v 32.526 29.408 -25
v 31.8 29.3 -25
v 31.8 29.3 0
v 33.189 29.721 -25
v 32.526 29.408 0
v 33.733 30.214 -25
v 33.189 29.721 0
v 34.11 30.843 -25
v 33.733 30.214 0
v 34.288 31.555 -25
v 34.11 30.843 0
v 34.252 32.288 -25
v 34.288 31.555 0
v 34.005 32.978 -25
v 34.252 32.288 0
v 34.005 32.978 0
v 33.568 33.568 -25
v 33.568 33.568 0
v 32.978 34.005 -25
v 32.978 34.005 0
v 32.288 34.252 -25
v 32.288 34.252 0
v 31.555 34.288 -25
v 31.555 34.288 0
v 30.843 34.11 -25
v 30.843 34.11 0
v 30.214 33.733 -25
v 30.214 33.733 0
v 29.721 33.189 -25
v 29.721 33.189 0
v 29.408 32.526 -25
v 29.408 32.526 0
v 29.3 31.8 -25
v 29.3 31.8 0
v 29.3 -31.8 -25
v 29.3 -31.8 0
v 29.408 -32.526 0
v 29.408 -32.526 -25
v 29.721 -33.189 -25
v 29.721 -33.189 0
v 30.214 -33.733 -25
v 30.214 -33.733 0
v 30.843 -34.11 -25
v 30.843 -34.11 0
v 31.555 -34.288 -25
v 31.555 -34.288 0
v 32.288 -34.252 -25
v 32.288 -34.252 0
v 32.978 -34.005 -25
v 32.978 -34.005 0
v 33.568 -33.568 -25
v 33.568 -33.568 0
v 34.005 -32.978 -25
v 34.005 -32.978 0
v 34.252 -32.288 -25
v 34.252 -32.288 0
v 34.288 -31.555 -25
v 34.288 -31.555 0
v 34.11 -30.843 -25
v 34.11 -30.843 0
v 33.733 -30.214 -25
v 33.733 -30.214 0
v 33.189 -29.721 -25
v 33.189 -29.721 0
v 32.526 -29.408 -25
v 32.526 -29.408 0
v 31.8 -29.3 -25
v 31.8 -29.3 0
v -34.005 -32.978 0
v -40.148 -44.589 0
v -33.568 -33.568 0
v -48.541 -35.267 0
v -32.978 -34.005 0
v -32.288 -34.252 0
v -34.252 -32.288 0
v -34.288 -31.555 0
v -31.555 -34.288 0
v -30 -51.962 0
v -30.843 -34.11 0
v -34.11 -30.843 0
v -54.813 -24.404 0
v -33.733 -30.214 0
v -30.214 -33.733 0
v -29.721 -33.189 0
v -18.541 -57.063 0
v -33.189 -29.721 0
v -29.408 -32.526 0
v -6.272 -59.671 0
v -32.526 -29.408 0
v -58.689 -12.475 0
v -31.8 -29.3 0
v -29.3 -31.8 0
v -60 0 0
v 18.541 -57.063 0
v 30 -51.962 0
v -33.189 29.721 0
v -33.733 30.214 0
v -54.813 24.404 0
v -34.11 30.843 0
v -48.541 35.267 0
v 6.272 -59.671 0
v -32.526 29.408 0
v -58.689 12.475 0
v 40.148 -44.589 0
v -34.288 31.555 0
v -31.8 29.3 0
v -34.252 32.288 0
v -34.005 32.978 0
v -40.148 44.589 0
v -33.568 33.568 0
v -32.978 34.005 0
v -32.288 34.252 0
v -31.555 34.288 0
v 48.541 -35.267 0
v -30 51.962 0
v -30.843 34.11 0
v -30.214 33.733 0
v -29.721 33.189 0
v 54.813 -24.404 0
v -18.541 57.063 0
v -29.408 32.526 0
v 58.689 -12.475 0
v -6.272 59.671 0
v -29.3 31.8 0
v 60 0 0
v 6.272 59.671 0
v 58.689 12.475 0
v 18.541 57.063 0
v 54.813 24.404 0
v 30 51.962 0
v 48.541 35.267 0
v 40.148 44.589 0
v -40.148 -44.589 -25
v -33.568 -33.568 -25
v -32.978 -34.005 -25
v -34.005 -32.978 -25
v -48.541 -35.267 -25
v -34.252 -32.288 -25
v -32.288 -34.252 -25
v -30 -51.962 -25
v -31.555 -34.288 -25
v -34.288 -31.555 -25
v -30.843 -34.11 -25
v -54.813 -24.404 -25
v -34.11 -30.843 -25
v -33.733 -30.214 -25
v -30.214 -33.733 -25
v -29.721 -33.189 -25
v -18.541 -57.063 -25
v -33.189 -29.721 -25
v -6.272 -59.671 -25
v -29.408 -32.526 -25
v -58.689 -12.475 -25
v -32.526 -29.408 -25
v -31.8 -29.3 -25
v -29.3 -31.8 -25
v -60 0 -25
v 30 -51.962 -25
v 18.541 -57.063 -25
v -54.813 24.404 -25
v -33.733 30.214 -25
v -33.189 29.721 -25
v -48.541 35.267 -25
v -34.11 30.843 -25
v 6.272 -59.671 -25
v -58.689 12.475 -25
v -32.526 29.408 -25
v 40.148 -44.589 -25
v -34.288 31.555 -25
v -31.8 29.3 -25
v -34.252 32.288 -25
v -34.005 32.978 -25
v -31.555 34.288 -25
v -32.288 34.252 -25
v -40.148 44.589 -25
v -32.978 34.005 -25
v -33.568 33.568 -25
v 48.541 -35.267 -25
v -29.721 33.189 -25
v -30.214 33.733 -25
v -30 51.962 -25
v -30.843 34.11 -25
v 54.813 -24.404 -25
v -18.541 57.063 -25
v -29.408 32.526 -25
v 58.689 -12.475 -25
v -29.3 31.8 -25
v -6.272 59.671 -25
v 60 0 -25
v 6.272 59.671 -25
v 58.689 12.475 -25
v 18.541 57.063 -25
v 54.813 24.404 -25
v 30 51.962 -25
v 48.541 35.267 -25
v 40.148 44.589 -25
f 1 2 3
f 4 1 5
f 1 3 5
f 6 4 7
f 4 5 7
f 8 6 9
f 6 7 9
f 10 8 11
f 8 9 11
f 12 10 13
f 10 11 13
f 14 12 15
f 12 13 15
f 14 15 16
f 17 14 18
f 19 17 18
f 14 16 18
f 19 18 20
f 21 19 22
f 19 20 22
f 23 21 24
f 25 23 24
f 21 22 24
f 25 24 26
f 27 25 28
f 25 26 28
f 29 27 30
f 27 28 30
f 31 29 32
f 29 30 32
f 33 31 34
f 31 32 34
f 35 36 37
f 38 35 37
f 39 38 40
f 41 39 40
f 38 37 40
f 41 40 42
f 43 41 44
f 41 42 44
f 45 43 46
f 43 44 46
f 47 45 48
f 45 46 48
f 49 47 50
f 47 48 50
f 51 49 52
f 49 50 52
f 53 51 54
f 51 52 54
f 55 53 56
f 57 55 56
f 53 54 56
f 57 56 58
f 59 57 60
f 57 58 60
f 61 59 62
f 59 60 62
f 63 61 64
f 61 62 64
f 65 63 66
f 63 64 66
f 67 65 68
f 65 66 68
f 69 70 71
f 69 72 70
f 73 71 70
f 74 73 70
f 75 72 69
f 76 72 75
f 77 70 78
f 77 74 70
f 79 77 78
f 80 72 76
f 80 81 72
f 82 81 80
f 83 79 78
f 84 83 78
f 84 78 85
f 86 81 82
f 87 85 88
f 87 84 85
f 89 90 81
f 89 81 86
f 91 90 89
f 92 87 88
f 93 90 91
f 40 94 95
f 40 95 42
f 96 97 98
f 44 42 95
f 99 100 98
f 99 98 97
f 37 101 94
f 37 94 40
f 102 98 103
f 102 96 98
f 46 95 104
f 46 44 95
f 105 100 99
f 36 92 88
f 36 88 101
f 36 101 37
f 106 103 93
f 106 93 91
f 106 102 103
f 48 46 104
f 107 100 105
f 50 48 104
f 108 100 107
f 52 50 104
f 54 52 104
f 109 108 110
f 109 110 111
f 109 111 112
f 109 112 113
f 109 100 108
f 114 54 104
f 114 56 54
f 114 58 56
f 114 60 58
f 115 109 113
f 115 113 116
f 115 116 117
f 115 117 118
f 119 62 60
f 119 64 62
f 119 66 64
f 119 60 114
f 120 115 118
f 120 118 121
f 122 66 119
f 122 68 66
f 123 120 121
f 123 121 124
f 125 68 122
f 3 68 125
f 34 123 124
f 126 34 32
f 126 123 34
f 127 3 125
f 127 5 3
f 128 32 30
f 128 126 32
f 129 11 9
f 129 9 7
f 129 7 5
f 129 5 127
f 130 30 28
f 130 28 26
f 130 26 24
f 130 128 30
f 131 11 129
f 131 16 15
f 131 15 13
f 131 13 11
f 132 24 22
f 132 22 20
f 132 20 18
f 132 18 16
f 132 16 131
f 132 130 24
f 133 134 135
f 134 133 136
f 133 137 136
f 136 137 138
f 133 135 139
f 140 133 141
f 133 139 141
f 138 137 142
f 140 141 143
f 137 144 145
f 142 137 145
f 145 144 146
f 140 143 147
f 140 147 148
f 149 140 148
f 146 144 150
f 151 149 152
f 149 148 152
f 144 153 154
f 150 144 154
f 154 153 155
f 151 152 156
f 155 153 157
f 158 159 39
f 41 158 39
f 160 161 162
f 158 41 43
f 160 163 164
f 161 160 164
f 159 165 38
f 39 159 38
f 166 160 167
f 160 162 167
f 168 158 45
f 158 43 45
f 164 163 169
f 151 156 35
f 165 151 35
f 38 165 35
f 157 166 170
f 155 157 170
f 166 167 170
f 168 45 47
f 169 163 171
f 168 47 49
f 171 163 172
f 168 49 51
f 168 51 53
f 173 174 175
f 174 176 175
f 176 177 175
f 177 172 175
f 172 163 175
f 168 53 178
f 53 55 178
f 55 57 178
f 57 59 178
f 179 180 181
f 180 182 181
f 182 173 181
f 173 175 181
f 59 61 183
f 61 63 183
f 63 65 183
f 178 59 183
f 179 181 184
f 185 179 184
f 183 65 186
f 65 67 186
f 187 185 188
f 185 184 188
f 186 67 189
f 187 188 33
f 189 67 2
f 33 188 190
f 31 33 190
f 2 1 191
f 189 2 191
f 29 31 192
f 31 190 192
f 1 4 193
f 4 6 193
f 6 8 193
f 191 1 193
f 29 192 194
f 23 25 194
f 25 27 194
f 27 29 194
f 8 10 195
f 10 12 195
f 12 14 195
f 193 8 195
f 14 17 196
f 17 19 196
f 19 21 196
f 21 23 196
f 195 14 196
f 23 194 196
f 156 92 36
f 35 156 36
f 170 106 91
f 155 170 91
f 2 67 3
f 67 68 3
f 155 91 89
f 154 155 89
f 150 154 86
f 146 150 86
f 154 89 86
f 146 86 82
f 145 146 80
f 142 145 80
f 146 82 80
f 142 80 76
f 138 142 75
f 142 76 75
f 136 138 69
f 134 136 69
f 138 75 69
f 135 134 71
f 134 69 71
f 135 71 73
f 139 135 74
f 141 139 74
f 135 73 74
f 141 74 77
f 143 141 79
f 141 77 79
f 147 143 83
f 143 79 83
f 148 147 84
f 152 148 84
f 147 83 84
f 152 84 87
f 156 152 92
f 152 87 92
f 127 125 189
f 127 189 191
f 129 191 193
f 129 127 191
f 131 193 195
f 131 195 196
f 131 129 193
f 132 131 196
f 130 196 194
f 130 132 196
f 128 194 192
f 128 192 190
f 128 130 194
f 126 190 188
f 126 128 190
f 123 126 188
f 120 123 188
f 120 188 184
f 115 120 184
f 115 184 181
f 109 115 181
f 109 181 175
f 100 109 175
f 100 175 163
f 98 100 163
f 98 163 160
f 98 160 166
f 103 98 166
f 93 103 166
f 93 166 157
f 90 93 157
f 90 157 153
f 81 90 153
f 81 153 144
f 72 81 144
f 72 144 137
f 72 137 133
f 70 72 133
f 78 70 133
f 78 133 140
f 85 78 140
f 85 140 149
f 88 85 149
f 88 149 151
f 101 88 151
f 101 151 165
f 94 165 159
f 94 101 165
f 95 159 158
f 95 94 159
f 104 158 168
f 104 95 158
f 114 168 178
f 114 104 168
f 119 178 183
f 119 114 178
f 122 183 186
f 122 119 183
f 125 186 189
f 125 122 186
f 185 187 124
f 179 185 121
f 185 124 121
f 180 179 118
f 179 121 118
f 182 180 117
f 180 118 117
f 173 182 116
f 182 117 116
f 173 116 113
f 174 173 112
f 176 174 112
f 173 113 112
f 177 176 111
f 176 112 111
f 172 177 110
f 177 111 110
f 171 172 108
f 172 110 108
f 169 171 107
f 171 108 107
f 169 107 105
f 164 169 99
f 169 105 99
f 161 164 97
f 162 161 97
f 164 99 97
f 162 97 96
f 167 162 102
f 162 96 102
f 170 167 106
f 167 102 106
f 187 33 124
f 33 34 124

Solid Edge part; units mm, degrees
sketch "Sketch1" plane through (0, 0, 0) normal (0, 0, 1) x (1, 0, 0)
  circle A0 centre (0, 0) radius 60
extrude "Protrusion1" add sketch "Sketch1" against normal blind 25
sketch "Sketch2" plane through (0, 0, 0) normal (0, 0, 1) x (1, 0, 0)
  line L0 (-31.8, -31.8) -> (31.8, -31.8)
  line L1 (31.8, -31.8) -> (31.8, 31.8)
  line L2 (31.8, 31.8) -> (-31.8, 31.8)
  line L3 (-31.8, 31.8) -> (-31.8, -31.8)
extrude "ExtrudedCutout_1" cut sketch "Sketch2" against normal blind 25
sketch "Sketch3" plane through (0, 0, 0) normal (0, 0, 1) x (0, 1, 0)
  circle A0 centre (31.8, 31.8) radius 2.5
  circle A1 centre (-31.8, 31.8) radius 2.5
  circle A2 centre (31.8, -31.8) radius 2.5
  circle A3 centre (-31.8, -31.8) radius 2.5
extrude "ExtrudedCutout_2" cut sketch "Sketch3" against normal blind 25
